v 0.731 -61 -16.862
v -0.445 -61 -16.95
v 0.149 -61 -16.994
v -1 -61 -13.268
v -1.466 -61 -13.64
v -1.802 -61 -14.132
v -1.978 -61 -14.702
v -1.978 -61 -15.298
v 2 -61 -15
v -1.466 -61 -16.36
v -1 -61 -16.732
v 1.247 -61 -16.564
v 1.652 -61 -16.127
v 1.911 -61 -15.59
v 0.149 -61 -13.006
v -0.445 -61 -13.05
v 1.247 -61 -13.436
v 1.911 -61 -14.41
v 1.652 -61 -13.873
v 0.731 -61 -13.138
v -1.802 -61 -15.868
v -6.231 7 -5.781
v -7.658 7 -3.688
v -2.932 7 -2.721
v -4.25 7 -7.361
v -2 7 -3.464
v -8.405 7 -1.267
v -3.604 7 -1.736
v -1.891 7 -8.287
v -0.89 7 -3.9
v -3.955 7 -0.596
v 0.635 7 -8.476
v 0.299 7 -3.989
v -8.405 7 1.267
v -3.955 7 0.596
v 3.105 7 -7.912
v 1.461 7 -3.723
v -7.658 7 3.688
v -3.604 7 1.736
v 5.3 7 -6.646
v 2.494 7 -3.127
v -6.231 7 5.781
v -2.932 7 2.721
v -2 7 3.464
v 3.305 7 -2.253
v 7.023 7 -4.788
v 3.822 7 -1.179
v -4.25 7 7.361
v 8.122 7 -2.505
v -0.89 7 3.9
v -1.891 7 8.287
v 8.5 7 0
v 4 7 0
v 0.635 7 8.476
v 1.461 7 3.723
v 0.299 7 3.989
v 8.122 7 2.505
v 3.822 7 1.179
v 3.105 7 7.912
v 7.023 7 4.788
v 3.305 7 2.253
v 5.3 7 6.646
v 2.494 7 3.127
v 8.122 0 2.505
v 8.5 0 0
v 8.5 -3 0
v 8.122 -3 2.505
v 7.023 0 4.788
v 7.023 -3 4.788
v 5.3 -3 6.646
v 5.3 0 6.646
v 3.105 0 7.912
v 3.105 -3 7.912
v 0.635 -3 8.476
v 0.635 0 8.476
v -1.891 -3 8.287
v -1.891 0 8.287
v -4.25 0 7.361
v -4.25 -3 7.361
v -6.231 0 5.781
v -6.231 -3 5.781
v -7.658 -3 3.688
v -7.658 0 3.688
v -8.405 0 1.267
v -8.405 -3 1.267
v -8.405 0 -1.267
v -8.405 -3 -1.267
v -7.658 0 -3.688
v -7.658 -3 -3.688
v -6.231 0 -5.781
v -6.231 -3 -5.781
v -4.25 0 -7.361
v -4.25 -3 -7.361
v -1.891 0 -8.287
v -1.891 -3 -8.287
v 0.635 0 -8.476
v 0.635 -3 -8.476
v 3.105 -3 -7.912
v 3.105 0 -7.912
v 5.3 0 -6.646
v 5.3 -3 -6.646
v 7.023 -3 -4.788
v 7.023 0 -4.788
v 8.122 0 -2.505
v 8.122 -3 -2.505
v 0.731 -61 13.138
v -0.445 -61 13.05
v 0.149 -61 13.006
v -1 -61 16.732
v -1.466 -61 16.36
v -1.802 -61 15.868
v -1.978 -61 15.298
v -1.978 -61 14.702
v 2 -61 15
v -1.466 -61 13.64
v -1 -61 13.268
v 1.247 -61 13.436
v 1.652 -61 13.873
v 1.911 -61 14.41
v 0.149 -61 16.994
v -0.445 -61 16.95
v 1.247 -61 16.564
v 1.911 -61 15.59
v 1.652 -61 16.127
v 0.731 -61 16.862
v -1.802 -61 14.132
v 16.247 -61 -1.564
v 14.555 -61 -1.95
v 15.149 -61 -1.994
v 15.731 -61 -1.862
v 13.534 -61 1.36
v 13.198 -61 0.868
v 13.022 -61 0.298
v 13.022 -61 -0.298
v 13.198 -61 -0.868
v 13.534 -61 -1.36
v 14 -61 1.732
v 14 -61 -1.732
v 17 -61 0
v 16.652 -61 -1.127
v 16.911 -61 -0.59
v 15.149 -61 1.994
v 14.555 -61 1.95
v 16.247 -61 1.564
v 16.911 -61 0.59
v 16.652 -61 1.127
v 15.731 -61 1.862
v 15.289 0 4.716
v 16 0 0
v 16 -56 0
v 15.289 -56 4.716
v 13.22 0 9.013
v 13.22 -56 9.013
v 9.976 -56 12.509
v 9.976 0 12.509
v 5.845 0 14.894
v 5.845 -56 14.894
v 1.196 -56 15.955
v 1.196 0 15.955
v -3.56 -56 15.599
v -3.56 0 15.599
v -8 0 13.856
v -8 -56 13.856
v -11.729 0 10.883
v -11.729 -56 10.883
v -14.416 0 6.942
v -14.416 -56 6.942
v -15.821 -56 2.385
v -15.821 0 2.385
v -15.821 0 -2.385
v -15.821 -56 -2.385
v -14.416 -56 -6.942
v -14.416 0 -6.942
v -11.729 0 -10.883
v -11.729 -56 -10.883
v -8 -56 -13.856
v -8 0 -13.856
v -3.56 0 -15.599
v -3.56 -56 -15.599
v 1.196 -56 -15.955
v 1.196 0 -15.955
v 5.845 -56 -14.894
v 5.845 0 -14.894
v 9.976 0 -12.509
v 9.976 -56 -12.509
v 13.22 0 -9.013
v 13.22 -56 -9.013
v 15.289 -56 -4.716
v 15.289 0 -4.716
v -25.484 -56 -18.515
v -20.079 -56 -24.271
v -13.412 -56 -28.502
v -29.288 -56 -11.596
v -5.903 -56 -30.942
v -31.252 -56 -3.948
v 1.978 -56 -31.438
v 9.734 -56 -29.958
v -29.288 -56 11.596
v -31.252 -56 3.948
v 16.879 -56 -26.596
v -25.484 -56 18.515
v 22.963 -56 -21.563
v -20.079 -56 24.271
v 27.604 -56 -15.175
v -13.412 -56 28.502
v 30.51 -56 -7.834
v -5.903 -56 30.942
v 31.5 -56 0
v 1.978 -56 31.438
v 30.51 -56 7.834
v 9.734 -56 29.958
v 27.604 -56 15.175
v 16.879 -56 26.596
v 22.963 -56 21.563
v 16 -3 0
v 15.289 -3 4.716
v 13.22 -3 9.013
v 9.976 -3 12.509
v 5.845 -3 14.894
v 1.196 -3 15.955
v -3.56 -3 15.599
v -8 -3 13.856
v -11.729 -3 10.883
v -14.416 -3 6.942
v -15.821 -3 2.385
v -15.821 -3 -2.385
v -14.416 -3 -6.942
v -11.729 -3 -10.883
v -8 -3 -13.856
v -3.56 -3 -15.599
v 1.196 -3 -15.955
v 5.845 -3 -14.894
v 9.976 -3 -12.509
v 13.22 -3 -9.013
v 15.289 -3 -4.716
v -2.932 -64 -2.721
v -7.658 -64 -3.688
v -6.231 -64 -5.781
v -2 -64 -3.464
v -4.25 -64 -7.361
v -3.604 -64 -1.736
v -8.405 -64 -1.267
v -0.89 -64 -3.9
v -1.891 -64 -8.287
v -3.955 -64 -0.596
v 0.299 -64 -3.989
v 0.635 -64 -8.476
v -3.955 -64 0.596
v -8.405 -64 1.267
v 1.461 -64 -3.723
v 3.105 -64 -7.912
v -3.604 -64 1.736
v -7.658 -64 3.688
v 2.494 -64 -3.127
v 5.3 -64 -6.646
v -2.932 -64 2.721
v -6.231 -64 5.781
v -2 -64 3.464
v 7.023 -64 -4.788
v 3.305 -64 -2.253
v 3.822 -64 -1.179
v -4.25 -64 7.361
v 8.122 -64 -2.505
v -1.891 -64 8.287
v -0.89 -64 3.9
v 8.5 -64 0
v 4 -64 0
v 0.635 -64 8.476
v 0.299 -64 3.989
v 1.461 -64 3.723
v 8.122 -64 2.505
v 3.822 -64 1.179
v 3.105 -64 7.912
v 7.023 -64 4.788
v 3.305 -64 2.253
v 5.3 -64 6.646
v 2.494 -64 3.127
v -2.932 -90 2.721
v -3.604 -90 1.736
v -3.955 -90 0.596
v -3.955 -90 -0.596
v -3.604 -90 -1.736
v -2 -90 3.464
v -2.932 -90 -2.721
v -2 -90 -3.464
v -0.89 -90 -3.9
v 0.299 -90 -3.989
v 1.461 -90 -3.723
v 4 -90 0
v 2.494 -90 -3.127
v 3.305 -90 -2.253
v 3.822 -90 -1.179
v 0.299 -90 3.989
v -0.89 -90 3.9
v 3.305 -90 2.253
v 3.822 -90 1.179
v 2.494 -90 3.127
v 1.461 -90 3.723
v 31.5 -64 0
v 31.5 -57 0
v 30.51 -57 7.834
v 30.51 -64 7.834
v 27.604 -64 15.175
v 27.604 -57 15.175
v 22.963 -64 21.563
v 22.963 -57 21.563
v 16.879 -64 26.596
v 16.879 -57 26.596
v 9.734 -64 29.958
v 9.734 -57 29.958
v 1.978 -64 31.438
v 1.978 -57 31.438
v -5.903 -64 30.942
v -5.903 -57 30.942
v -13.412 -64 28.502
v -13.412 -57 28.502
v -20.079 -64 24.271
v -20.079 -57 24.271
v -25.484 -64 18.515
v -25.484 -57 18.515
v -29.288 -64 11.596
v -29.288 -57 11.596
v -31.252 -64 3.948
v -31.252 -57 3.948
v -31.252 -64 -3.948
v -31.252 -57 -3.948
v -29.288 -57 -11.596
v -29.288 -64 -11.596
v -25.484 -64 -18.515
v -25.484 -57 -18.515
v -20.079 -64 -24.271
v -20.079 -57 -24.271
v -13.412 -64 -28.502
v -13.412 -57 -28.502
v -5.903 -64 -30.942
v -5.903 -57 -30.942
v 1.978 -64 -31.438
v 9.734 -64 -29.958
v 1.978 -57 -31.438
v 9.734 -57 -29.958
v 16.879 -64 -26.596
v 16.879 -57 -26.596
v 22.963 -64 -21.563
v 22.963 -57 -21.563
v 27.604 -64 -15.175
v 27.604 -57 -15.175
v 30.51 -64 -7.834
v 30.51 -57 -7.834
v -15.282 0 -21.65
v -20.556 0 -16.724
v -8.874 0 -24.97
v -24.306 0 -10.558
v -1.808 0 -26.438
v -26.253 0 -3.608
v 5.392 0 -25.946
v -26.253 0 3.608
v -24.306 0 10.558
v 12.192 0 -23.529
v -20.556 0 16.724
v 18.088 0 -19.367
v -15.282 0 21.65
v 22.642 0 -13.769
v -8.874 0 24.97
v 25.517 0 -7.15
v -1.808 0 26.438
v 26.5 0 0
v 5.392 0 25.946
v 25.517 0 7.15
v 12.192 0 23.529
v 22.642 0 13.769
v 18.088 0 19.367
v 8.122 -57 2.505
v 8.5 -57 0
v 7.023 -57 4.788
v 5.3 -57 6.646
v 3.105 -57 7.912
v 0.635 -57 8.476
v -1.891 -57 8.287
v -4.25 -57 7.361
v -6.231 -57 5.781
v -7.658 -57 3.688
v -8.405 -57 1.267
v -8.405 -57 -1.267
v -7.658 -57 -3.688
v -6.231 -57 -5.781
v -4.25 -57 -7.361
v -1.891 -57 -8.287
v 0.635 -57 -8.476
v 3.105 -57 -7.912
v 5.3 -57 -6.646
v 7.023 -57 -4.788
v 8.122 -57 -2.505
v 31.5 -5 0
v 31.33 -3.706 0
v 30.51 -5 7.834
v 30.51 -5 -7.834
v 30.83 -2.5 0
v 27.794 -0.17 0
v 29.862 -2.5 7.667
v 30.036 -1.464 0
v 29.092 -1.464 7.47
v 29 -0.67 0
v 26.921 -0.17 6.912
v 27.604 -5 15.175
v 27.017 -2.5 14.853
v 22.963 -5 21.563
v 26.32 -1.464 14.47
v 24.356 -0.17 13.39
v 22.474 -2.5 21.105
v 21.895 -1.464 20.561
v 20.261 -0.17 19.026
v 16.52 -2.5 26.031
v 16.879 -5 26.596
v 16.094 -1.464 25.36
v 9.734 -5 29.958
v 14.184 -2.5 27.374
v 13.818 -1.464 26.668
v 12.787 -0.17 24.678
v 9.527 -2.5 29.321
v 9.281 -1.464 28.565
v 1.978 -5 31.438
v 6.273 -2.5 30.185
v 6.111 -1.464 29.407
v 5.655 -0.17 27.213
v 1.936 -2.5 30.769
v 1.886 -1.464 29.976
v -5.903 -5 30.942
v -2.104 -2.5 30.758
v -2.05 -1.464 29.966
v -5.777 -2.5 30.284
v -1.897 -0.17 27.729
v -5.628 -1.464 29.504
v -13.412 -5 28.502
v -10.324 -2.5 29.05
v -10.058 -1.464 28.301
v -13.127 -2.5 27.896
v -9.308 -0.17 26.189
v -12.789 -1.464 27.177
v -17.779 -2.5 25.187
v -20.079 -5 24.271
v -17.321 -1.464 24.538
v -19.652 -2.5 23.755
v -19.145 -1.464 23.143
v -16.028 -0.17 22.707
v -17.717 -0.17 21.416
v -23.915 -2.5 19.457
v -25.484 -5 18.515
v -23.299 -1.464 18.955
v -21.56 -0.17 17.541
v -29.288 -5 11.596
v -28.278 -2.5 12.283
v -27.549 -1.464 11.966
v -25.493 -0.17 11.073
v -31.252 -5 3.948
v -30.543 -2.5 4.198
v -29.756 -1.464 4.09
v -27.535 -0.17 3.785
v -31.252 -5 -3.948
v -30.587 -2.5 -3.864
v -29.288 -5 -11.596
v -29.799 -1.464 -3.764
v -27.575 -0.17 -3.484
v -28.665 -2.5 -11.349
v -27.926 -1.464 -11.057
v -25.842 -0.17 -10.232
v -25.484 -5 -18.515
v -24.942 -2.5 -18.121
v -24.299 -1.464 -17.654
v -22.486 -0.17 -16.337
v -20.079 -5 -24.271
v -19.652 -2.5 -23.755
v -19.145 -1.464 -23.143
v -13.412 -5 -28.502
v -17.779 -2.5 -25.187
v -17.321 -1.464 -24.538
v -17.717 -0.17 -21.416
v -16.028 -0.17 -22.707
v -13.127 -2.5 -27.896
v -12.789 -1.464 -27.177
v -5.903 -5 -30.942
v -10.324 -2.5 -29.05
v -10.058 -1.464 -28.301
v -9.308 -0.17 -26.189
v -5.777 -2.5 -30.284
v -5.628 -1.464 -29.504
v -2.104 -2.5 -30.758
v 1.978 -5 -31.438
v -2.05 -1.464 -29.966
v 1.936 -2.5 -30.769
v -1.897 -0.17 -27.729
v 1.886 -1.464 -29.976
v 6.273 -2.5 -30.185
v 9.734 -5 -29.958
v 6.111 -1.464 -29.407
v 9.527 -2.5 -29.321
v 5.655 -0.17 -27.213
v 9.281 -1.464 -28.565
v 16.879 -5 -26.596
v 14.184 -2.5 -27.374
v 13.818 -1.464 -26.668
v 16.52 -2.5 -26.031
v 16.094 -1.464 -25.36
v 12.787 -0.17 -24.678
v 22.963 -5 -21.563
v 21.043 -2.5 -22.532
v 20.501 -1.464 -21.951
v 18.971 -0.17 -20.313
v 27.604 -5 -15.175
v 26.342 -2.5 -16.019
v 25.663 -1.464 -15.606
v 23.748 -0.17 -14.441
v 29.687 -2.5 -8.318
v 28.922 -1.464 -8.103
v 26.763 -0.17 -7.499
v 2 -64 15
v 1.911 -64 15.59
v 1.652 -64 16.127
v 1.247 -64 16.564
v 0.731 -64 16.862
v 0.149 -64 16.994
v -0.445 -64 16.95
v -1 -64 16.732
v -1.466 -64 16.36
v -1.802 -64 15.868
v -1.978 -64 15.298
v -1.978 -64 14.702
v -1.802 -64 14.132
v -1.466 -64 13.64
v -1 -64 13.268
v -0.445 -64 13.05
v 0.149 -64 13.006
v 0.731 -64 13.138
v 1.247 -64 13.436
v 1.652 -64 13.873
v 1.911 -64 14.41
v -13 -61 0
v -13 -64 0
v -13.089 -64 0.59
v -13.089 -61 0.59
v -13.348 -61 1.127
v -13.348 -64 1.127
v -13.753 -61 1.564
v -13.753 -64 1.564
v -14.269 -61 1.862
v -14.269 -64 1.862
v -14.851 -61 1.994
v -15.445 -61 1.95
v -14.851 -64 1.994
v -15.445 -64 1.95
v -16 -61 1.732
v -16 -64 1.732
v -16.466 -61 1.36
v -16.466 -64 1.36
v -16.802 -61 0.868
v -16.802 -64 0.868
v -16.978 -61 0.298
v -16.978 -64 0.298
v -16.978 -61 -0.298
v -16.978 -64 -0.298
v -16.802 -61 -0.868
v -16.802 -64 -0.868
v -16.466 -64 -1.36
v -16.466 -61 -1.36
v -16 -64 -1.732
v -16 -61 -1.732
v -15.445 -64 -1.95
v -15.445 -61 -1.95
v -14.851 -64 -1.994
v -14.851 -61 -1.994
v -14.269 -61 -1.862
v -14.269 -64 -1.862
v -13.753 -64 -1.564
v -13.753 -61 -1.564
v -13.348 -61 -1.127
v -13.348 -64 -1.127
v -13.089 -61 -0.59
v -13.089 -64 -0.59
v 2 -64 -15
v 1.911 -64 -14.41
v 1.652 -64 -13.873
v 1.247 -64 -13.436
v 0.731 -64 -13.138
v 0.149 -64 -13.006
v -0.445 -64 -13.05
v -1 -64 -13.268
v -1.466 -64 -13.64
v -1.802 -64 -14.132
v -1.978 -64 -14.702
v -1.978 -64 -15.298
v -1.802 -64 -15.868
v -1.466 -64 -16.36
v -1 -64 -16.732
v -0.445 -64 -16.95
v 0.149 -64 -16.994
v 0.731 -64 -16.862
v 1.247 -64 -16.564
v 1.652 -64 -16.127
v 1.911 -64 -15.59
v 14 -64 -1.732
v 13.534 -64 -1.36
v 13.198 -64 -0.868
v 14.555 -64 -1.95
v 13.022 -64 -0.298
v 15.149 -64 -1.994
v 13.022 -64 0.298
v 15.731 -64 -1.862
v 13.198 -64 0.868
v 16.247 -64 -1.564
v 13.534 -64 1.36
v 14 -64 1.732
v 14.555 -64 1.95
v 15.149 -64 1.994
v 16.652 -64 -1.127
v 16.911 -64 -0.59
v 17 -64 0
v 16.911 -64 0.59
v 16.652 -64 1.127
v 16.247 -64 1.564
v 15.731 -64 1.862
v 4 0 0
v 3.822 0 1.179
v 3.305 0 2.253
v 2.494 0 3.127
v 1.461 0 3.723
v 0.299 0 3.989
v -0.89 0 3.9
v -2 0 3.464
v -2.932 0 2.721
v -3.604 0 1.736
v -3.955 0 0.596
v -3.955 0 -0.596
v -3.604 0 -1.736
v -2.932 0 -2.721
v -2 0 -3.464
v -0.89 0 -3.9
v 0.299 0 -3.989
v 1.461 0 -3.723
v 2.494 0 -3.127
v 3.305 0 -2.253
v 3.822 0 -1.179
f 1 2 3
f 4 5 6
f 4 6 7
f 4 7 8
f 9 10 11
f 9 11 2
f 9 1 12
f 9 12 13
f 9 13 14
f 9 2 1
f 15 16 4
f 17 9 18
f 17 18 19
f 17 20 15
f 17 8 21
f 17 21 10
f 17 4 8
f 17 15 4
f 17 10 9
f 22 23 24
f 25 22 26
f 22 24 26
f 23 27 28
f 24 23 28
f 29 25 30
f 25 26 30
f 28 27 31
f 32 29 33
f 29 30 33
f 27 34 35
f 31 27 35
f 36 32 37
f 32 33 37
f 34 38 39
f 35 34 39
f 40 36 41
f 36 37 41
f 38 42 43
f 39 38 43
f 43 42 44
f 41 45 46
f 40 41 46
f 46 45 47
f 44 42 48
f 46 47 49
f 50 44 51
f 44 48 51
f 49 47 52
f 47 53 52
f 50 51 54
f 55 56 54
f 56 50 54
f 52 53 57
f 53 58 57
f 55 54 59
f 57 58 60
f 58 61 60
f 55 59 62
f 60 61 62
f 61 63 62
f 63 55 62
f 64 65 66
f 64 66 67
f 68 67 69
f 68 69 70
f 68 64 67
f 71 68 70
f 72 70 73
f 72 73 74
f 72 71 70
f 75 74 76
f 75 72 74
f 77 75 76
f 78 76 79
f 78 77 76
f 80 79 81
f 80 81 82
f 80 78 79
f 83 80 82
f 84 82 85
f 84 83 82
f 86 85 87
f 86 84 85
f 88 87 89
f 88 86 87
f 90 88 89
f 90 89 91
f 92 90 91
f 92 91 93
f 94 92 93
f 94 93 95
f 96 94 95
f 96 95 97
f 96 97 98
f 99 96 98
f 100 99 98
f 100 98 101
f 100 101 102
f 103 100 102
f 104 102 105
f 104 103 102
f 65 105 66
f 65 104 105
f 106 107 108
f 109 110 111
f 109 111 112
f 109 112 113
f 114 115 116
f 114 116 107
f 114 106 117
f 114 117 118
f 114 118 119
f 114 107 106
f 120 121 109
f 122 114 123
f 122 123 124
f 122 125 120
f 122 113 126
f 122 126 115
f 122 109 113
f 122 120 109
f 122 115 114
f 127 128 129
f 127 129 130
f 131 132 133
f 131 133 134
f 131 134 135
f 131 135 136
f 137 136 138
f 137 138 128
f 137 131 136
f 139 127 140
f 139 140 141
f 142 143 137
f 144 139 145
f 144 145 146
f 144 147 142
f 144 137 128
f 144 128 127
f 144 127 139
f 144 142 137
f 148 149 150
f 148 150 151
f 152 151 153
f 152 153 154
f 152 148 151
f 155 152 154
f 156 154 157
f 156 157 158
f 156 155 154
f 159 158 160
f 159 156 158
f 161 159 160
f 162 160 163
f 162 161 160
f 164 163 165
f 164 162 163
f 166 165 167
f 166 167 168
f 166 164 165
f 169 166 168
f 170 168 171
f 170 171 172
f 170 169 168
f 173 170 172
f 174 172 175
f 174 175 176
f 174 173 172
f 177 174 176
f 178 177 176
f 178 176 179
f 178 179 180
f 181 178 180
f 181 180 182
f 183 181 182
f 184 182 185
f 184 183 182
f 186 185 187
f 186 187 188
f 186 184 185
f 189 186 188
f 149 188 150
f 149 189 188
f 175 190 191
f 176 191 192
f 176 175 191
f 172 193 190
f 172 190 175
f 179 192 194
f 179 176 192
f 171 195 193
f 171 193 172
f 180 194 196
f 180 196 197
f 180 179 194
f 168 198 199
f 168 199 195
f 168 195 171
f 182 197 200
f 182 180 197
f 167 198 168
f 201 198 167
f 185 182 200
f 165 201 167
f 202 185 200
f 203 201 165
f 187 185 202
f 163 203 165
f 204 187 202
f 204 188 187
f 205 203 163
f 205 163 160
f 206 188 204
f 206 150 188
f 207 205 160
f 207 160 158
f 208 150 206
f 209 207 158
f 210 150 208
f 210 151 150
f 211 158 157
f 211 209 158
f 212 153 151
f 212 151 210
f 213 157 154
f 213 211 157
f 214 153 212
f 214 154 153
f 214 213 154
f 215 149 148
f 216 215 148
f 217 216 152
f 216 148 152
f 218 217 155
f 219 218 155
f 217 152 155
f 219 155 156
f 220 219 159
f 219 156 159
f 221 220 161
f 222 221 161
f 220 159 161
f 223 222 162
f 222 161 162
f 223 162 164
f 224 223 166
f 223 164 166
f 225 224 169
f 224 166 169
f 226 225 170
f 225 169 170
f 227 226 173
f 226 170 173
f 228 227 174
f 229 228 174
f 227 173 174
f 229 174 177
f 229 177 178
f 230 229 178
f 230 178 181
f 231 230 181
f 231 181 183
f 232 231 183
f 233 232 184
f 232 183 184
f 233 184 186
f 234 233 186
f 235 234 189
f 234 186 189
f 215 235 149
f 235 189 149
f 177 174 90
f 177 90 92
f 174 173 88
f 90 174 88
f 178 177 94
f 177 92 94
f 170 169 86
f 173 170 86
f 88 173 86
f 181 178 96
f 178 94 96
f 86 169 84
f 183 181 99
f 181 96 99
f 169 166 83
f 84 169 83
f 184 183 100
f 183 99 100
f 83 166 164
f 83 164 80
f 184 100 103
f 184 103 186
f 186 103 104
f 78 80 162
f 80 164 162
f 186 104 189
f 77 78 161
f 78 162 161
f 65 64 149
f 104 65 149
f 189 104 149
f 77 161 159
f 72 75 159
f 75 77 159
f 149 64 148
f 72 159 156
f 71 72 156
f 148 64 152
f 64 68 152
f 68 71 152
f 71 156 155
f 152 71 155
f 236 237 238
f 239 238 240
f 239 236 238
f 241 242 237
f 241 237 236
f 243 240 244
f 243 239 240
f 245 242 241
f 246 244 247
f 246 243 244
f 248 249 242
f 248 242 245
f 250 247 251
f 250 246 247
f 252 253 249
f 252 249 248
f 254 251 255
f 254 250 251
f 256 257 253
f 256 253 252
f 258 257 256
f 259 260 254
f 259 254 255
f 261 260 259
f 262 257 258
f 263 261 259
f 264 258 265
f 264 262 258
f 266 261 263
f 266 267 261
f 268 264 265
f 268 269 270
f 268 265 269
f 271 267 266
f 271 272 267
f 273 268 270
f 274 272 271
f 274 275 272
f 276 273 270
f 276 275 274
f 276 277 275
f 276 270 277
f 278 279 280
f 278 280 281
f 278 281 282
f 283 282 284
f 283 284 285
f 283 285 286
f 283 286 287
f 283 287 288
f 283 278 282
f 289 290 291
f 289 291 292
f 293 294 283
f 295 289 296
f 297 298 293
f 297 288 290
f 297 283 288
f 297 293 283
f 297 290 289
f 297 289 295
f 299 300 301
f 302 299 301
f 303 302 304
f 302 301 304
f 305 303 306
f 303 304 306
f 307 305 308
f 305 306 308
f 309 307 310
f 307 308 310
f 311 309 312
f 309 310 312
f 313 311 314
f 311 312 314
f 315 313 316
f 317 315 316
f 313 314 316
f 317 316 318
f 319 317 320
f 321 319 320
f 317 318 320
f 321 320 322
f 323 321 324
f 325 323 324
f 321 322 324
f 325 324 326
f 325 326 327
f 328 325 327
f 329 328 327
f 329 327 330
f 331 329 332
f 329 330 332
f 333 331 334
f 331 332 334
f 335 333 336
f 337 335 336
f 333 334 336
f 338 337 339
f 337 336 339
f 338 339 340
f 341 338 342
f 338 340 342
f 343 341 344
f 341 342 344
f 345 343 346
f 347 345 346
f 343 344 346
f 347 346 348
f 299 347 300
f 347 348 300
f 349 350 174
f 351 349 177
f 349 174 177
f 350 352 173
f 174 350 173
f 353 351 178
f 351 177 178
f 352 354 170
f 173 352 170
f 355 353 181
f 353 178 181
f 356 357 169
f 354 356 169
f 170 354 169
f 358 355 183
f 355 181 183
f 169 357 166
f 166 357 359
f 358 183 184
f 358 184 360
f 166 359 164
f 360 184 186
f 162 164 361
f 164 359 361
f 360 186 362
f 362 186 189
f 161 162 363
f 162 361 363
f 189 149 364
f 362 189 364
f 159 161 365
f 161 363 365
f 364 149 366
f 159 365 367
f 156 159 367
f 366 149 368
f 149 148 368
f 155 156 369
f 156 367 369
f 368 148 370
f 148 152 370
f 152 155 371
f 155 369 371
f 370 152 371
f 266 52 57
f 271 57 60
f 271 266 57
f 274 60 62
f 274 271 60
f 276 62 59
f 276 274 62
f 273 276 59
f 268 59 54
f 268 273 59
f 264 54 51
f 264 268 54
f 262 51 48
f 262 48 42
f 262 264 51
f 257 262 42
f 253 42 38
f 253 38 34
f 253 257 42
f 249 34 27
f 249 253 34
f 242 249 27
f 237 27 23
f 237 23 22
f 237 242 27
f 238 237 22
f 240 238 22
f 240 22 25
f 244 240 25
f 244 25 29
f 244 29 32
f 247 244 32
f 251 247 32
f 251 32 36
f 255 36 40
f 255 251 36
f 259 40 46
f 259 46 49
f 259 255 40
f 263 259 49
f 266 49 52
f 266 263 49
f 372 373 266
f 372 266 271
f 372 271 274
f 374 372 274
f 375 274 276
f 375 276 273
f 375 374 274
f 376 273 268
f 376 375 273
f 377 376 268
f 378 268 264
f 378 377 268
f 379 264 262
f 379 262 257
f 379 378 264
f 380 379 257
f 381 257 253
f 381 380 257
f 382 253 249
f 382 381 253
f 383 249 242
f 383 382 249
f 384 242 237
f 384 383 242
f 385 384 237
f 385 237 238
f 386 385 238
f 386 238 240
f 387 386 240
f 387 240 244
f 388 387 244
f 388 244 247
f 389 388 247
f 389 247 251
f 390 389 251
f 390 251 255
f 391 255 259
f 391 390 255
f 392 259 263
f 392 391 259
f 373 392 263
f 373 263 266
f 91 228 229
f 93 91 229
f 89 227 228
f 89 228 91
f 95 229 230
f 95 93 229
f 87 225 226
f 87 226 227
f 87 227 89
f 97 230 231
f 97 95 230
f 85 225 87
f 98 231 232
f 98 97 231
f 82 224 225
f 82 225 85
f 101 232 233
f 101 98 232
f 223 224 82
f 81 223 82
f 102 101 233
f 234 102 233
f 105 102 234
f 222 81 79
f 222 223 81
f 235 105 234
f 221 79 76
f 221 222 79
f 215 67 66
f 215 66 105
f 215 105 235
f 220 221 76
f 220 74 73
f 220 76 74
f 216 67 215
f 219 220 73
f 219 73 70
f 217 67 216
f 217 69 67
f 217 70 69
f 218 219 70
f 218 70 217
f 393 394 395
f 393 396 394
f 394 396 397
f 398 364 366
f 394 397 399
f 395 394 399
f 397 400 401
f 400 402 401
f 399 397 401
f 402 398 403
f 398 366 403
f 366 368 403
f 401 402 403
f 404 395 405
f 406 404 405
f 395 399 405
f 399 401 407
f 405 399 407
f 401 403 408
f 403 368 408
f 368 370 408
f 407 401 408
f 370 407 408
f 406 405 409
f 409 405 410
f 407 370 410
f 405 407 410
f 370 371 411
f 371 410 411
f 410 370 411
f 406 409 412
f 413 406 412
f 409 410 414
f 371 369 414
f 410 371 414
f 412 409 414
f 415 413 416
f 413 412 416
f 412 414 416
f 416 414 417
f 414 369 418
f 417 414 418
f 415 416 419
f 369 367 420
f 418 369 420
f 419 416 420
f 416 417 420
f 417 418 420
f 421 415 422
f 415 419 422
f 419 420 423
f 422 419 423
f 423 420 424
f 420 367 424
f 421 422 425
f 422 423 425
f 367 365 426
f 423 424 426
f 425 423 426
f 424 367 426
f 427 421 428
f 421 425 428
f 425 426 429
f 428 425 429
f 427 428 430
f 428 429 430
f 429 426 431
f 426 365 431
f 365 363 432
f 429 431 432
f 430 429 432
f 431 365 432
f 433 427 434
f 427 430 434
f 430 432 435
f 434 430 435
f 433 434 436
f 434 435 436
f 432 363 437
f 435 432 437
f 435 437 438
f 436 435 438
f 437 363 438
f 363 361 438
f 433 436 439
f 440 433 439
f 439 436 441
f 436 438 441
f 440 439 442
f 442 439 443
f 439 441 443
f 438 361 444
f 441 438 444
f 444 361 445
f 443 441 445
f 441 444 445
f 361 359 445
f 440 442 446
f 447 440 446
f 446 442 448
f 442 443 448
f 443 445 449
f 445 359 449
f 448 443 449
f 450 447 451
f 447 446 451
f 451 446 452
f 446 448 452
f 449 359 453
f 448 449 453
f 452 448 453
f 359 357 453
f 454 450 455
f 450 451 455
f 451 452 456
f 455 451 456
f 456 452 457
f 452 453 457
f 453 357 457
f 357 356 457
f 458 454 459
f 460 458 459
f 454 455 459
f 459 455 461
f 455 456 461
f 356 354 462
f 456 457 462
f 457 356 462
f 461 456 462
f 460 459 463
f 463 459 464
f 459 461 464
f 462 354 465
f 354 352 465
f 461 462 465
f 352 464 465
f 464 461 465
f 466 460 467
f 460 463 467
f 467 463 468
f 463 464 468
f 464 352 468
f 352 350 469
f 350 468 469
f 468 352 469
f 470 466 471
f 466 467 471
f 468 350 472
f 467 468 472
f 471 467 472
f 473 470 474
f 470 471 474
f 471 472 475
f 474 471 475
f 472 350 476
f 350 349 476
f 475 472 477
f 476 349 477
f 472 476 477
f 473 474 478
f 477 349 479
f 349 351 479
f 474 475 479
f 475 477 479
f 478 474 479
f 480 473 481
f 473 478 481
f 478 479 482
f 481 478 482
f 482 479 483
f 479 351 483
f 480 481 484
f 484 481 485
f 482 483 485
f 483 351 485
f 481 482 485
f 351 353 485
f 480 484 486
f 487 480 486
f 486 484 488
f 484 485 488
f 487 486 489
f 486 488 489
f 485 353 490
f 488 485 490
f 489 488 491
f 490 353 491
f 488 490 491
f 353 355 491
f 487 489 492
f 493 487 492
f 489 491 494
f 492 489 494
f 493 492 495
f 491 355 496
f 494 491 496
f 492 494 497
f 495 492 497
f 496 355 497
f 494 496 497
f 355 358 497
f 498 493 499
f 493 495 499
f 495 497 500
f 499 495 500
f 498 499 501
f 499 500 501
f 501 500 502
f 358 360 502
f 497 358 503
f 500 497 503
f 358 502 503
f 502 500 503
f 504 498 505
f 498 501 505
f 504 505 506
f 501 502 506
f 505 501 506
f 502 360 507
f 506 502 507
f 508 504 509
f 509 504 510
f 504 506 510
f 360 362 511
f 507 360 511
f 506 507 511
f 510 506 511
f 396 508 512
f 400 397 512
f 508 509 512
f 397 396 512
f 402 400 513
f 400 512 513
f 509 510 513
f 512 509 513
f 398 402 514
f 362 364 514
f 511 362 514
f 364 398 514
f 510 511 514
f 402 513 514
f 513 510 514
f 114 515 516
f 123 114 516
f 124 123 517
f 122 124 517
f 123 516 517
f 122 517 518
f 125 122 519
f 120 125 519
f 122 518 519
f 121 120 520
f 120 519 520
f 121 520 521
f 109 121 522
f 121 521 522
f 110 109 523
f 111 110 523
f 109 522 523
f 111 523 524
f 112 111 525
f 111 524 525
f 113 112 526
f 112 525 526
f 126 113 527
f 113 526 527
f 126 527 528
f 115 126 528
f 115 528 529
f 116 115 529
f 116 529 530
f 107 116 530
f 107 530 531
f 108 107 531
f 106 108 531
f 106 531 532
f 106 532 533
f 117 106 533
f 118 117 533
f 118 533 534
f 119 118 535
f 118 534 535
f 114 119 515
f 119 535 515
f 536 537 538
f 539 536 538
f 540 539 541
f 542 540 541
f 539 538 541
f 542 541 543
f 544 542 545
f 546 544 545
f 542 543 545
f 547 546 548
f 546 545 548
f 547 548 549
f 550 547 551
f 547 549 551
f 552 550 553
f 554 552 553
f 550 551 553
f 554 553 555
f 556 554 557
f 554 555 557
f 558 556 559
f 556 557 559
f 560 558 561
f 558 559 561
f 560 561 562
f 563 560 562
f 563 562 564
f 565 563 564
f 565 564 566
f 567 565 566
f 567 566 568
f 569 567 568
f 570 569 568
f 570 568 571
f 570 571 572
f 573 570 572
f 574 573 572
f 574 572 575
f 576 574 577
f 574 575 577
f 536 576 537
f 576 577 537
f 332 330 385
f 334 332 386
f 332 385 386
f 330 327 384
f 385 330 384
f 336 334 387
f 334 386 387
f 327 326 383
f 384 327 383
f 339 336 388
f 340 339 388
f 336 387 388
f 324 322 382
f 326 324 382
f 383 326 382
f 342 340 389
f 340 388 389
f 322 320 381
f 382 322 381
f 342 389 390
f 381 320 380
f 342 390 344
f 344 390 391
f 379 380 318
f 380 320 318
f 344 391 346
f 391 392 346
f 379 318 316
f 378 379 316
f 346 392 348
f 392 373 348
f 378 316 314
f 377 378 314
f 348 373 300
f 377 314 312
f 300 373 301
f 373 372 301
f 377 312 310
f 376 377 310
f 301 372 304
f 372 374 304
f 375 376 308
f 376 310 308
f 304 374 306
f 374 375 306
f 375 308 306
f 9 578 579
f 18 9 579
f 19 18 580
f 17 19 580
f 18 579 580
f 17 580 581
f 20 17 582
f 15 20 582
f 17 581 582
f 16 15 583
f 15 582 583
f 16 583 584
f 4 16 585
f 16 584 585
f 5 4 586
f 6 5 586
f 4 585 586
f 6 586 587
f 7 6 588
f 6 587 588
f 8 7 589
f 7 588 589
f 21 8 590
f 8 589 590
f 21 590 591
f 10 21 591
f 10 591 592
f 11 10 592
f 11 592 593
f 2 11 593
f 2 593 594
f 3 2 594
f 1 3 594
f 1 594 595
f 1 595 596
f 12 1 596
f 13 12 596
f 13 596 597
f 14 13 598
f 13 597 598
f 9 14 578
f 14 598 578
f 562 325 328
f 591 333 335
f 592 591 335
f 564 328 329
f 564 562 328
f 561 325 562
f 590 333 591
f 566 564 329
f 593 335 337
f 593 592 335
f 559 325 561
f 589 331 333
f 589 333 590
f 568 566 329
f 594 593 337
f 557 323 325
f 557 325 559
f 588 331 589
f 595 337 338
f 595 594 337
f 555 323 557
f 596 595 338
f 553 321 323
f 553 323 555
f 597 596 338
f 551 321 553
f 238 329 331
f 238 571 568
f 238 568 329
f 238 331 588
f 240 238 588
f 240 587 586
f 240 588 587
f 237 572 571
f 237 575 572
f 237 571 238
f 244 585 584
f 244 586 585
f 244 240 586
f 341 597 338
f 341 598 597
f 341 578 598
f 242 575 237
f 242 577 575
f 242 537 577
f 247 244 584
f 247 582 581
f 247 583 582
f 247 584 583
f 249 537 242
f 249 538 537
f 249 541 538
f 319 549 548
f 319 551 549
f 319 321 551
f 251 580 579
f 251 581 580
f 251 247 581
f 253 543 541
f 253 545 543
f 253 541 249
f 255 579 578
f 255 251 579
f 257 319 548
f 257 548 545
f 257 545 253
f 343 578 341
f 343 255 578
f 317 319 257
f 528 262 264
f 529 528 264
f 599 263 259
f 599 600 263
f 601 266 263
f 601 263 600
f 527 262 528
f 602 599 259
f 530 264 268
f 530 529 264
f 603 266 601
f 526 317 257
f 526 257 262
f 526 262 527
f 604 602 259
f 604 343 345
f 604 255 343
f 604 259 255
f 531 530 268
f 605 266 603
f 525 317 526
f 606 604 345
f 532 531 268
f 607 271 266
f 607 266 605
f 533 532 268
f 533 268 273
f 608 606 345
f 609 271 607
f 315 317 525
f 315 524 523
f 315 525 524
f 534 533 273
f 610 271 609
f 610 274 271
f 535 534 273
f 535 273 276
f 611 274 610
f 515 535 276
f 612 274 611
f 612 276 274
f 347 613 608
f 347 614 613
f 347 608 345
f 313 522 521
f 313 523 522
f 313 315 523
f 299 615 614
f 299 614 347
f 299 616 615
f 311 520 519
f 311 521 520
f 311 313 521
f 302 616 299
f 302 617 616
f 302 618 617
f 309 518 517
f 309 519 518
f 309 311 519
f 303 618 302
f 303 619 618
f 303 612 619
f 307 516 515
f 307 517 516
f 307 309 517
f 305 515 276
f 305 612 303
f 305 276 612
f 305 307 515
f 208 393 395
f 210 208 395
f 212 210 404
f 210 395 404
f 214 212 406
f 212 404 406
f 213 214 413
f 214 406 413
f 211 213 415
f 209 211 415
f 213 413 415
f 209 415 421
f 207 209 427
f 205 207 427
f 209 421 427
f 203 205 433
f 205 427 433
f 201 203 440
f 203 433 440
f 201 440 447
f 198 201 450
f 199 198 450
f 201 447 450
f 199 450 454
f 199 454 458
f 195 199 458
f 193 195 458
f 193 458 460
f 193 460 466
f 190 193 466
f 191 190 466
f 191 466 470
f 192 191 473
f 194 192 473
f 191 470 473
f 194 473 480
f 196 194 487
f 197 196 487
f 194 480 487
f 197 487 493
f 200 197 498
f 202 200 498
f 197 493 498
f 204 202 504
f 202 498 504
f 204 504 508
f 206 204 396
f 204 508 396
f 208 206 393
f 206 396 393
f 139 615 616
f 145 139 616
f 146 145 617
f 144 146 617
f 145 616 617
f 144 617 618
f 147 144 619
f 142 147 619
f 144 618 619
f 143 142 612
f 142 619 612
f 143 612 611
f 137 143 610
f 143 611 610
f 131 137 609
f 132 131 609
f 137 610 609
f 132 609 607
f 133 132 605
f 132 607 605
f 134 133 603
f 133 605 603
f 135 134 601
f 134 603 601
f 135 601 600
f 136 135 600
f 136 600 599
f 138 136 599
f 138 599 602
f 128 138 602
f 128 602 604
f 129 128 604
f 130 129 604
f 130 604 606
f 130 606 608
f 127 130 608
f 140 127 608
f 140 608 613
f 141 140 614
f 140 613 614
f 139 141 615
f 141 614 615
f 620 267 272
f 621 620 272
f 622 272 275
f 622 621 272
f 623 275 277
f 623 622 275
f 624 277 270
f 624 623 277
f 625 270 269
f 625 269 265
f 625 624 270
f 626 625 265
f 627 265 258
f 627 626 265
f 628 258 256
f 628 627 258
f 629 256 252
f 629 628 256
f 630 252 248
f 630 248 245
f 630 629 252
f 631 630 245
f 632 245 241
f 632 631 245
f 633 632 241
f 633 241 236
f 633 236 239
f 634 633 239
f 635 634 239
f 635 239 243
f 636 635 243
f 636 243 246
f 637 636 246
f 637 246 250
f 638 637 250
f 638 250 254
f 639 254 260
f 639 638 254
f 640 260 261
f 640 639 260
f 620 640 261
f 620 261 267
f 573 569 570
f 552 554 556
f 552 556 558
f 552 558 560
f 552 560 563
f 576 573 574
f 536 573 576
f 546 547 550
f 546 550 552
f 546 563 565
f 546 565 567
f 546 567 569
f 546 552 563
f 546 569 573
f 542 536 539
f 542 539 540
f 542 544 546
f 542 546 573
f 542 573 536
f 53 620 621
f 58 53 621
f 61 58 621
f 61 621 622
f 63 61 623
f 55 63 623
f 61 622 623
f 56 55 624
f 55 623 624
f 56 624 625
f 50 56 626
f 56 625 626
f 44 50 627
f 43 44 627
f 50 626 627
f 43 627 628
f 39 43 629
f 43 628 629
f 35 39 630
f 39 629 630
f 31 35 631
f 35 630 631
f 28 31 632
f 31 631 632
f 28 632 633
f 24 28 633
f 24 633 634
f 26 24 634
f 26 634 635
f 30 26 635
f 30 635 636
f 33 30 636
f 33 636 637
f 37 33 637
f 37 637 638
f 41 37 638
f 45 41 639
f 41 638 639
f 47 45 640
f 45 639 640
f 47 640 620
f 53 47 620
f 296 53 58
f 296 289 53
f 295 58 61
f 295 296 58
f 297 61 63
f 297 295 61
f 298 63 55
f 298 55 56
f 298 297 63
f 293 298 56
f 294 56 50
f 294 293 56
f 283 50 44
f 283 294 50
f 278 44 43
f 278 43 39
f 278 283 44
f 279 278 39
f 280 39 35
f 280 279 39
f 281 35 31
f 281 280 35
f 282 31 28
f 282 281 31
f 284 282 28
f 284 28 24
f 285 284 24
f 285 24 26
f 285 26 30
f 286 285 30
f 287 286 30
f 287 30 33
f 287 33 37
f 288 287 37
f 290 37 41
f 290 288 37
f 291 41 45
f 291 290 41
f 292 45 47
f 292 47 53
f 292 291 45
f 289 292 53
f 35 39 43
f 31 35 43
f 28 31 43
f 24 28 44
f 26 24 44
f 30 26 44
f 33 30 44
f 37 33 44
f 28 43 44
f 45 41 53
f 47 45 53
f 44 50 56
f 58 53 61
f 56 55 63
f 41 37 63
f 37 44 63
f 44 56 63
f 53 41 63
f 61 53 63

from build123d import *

# Parameters (mm, degrees)
F0_R          = 31.5
F0_R_2        = 16
F1_DEPTH      = 56
F2_R          = 5
F0_R_3        = 8.5
F0_R_4        = 4
F3_DEPTH      = 64
F3_DEPTH_BACK = 7
F4_DEPTH      = 90
F4_DEPTH_BACK = 7
F5_DEPTH      = 3
F6_START      = 57
F6_DEPTH      = 7
F7_R          = 2
F8_DEPTH      = 3


with BuildPart() as f1:
    # F0 (on Front) → F1 (new body)
    with BuildSketch(Plane.XZ):
        Circle(F0_R)
        Circle(F0_R_2, mode=Mode.SUBTRACT)
    extrude(amount=F1_DEPTH)

    # F2
    f2_edges = [f1.edges().sort_by_distance(p)[0] for p in [
        (-31.5, 0, 0),
    ]]
    fillet(f2_edges, radius=F2_R)


with BuildPart() as f3:
    # F0 (on Front) → F3 (new body, two sides)
    with BuildSketch(Plane.XZ) as f3_sk:
        Circle(F0_R_3)
        Circle(F0_R_4, mode=Mode.SUBTRACT)
    extrude(amount=F3_DEPTH)
    extrude(f3_sk.sketch, amount=-F3_DEPTH_BACK)


with BuildPart() as f4:
    # F0 (on Front) → F4 (new body, two sides)
    with BuildSketch(Plane.XZ) as f4_sk:
        Circle(F0_R_4)
    extrude(amount=F4_DEPTH)
    extrude(f4_sk.sketch, amount=-F4_DEPTH_BACK)


with BuildPart() as f5:
    # F0 (on Front) → F5 (new body)
    with BuildSketch(Plane.XZ):
        Circle(F0_R_2)
        Circle(F0_R_3, mode=Mode.SUBTRACT)
    extrude(amount=F5_DEPTH)


with BuildPart() as f6:
    # F0 (on Front) → F6 (new body)
    with BuildSketch(Plane.XZ.offset(F6_START)):
        Circle(F0_R)
        Circle(F0_R_2, mode=Mode.SUBTRACT)
        Circle(F0_R_2)
        Circle(F0_R_3, mode=Mode.SUBTRACT)
    extrude(amount=F6_DEPTH)

    # F7 (on face) → F8 (cut)
    with BuildSketch(Plane.XZ.offset(64)):
        with Locations((0, 15)):
            Circle(F7_R)
        with Locations((-15, 0)):
            Circle(F7_R)
        with Locations((0, -15)):
            Circle(F7_R)
        with Locations((15, 0)):
            Circle(F7_R)
    extrude(amount=-F8_DEPTH, mode=Mode.SUBTRACT)


solid = Compound([f1.part, f3.part, f4.part, f5.part, f6.part])
